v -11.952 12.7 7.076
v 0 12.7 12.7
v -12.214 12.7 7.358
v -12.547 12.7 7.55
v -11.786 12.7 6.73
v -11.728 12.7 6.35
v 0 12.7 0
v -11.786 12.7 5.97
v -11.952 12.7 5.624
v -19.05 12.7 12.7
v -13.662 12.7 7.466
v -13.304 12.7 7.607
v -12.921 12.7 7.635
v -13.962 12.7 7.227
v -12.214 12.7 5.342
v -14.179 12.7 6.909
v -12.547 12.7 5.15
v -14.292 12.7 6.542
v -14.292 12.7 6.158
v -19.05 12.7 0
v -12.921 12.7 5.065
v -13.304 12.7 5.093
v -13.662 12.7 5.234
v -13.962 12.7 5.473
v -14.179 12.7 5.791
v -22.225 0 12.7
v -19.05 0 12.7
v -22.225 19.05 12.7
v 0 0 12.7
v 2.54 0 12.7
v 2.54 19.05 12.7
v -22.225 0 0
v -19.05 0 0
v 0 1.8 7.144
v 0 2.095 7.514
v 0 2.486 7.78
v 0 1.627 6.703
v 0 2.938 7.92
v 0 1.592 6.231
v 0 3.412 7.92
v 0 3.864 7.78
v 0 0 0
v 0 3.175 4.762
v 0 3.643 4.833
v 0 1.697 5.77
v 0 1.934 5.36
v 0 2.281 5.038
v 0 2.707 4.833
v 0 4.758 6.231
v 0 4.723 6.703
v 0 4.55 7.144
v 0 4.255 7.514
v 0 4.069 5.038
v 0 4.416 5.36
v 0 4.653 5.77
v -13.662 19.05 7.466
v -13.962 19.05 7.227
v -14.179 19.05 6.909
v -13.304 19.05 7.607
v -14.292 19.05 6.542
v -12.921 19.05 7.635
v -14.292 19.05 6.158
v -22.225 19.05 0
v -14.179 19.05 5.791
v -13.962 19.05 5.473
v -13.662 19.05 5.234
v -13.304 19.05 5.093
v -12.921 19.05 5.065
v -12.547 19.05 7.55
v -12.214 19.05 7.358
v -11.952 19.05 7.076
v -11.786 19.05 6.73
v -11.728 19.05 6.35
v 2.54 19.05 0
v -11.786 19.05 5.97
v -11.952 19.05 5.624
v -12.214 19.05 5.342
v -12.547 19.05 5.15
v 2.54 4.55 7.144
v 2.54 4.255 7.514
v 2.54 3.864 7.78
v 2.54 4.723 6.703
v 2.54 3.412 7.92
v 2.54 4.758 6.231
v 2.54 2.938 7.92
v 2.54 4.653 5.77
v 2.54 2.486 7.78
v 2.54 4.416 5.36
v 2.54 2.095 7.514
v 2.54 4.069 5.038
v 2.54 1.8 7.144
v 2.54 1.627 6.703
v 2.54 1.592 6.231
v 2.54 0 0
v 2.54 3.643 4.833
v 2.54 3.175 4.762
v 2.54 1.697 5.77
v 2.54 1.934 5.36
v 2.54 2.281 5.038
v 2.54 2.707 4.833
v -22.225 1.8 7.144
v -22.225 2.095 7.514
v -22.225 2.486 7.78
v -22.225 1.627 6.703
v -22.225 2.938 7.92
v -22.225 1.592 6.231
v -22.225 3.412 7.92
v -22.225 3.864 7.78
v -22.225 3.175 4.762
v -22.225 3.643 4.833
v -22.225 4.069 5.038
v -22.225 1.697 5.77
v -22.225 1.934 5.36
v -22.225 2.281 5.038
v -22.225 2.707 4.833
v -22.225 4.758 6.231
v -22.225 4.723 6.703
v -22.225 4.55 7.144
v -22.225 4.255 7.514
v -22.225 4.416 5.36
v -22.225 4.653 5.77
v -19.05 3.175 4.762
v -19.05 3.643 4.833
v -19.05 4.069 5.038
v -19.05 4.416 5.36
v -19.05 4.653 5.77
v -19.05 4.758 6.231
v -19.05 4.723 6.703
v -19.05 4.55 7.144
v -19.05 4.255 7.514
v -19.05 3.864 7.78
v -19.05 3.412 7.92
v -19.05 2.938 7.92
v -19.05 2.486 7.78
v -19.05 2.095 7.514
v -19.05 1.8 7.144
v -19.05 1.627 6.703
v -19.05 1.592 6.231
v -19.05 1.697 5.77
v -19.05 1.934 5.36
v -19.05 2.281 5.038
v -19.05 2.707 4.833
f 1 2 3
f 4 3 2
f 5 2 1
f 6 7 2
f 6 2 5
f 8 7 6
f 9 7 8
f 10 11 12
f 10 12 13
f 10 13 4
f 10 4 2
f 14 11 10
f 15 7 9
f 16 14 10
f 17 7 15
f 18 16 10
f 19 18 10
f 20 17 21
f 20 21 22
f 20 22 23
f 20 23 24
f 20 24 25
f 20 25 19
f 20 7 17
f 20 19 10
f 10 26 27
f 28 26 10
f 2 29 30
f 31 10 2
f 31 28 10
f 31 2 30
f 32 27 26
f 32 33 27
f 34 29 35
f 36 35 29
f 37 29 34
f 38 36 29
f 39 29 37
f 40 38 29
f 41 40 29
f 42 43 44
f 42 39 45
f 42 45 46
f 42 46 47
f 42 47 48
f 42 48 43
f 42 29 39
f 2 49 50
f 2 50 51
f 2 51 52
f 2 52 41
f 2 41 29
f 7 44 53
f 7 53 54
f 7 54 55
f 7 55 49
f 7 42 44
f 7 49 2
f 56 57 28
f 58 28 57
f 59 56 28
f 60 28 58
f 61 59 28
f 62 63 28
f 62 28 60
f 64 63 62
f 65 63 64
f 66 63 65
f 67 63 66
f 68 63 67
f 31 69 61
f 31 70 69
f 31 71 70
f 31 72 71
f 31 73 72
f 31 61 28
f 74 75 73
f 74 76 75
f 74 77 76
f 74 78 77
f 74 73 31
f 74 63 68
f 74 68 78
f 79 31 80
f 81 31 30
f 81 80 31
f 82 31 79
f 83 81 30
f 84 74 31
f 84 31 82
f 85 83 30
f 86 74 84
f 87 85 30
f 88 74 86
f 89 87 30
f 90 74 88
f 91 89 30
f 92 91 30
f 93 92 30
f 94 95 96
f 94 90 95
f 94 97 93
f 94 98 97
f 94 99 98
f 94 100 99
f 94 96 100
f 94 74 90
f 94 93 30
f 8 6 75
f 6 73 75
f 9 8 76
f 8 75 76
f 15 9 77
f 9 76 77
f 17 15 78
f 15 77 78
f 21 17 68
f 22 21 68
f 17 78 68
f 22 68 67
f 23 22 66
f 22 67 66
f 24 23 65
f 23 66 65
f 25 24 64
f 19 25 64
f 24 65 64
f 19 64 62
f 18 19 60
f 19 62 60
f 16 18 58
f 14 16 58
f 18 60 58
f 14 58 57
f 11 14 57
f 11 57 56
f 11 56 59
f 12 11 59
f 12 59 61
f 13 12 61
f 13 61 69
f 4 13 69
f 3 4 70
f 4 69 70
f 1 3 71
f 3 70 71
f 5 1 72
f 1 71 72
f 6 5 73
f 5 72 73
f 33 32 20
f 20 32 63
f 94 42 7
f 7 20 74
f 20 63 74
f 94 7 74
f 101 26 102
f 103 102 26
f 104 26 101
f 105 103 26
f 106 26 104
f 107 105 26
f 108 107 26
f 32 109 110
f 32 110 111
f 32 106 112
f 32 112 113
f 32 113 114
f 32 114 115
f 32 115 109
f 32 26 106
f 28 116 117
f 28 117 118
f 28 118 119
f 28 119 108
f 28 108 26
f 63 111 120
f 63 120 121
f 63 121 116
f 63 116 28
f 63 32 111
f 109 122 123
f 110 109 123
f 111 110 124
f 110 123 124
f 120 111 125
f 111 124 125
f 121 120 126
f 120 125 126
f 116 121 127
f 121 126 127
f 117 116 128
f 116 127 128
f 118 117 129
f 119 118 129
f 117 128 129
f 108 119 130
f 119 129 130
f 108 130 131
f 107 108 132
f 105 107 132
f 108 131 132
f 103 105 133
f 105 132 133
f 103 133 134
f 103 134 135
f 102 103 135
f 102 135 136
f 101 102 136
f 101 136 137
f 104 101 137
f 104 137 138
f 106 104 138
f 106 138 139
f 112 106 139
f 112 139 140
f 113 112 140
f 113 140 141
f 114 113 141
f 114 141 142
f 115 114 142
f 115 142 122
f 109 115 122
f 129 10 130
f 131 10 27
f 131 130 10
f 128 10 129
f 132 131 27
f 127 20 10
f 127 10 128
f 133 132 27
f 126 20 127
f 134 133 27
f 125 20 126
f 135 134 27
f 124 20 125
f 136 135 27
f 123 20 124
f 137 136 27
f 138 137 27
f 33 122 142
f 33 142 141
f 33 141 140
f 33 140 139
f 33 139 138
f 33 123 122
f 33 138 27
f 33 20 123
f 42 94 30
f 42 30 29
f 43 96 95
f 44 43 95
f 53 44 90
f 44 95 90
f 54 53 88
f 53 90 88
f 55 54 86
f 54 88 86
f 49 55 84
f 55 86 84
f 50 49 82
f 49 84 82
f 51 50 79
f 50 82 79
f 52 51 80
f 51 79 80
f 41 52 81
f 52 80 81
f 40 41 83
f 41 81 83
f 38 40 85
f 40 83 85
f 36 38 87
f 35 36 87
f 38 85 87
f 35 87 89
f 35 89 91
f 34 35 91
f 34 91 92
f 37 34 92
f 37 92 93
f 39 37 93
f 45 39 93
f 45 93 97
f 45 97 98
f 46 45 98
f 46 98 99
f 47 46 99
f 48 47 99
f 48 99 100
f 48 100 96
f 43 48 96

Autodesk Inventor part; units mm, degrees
ref_plane "YZ Plane" through (0, 0, 0) normal (1, 0, 0) x (0, 1, 0)
ref_plane "XZ Plane" through (0, 0, 0) normal (0, 1, 0) x (-1, 0, 0)
ref_plane "XY Plane" through (0, 0, 0) normal (0, 0, 1) x (1, 0, 0)
sketch "Sketch1" plane through (0, 0, 0) normal (0, 0, 1) x (1, 0, 0)
  line L0 (0, 0) -> (0, 12.7)
  line L1 (0, 12.7) -> (-19.05, 12.7)
  line L2 (-19.05, 12.7) -> (-19.05, 0)
  line L3 (-19.05, 0) -> (-22.225, 0)
  line L4 (-22.225, 0) -> (-22.225, 19.05)
  line L5 (-22.225, 19.05) -> (2.54, 19.05)
  line L6 (2.54, 19.05) -> (2.54, 0)
  line L7 (2.54, 0) -> (0, 0)
  dimension "d0" = 12.7
  dimension "d1" = 19.05
  dimension "d2" = 3.175
  dimension "d4" = 19.05
  dimension "d5" = 24.765
extrude "Extrusion1" add sketch "Sketch1" along normal blind 12.7
sketch "Sketch2" plane through (-22.225, 19.05, 0) normal (0, 1, 0) x (1, 0, 0)
  line L0 (0, 0) -> (0, -12.7) projected
  line L1 (24.765, 0) -> (24.765, -12.7) projected
  line L2 (0, -6.35) -> (9.2075, -6.35)
  circle A0 centre (9.2075, -6.35) radius 1.2891
  point P0 (22.225, 0)
  dimension "d8" = 2.5781
extrude "Extrusion2" cut sketch "Sketch2" against normal blind 25.4
sketch "Sketch3" plane through (2.54, 0, 0) normal (1, 0, 0) x (0, 0, -1)
  line L0 (0, 0) -> (-12.7, 0) projected
  line L1 (-6.35, 0) -> (-6.35, 3.175)
  circle A0 centre (-6.35, 3.175) radius 1.5875
  dimension "d12" = 3.175
  dimension "d14" = 3.175
extrude "Extrusion3" cut sketch "Sketch3" against normal blind 25.4
properties part number "tiny clevis" material "Aluminum 6061"
